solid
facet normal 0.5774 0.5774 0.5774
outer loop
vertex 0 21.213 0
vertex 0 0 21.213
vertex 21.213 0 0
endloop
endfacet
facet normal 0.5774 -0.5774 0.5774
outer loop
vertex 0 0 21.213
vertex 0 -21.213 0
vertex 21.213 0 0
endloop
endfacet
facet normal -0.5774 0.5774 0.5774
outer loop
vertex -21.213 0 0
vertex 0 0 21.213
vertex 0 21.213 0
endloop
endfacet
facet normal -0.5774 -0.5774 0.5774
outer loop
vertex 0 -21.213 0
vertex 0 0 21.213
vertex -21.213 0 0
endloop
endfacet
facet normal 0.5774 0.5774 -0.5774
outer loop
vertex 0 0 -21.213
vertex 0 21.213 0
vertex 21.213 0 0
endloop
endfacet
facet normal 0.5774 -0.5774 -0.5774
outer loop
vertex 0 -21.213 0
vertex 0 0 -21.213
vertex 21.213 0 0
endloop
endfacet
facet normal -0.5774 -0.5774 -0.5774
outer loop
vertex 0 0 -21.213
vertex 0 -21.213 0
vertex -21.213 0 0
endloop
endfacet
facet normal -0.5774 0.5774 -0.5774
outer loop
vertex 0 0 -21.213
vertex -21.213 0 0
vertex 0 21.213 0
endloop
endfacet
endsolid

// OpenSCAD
// Regular Octahedron
// (C) @oblomobka - 2023.06
// GPL license

/* **CUSTOMIZER VARIABLES** */
// Edge
edge = 30; //[10:100]
// Center of the solid or stand over a face
position = "Center"; //["Center", "Face"]

/* **MODULES** */
module OctahedronRegular ( edge = 30, position = "Face"){ 
    
    // Invariants
    diAngleOctahedron = acos(-1/3); // dihedral angle of octahedron = 109,471
    
    // Relations
    rCirOctahedron = 1/sqrt(2); // radius of a circumscribed sphere for edge = 1 / = 0,707..
    rInsOctahedron = sqrt(6)/6; // radius of a inscribed sphere for edge = 1 / = 0,408
    rMidOctahedron = 1/2; // Midradius, which touches the middle of each edge / =0,5
    
    // Variables
    a = edge/sqrt(2);
    
    // Definition of points and faces V = 6 / F = 8
    Opoints = [
        [ +a, 0, 0], [ 0, +a, 0], [ 0, 0, +a],
        [ -a, 0, 0], [ 0, -a, 0], [ 0, 0, -a]
        ];
    
    Ofaces = [
        [ 0, 2, 1], [ 0, 4, 2], [ 1, 2, 3], [ 3, 2, 4],     // UP faces
        [ 0, 1, 5], [ 0, 5, 4], [ 3, 4, 5], [ 1, 3, 5]      // DOWN faces
        ];
    
    // Polyhedron stands on xy plane centered on the center of the face or centered on the center of polyhedron
    if ( position == "Face"){
        translate ([ 0, 0, edge*rInsOctahedron])
            rotate ([ -diAngleOctahedron/2, 0, 0])    
                rotate ([ 0, 0, 45])
                    polyhedron ( Opoints, Ofaces);}
                    
    else if ( position == "Center") {
        polyhedron ( Opoints, Ofaces);} 
}

/* **RENDERING OF SOLIDS** */ 
OctahedronRegular ( edge = edge, position = position);
